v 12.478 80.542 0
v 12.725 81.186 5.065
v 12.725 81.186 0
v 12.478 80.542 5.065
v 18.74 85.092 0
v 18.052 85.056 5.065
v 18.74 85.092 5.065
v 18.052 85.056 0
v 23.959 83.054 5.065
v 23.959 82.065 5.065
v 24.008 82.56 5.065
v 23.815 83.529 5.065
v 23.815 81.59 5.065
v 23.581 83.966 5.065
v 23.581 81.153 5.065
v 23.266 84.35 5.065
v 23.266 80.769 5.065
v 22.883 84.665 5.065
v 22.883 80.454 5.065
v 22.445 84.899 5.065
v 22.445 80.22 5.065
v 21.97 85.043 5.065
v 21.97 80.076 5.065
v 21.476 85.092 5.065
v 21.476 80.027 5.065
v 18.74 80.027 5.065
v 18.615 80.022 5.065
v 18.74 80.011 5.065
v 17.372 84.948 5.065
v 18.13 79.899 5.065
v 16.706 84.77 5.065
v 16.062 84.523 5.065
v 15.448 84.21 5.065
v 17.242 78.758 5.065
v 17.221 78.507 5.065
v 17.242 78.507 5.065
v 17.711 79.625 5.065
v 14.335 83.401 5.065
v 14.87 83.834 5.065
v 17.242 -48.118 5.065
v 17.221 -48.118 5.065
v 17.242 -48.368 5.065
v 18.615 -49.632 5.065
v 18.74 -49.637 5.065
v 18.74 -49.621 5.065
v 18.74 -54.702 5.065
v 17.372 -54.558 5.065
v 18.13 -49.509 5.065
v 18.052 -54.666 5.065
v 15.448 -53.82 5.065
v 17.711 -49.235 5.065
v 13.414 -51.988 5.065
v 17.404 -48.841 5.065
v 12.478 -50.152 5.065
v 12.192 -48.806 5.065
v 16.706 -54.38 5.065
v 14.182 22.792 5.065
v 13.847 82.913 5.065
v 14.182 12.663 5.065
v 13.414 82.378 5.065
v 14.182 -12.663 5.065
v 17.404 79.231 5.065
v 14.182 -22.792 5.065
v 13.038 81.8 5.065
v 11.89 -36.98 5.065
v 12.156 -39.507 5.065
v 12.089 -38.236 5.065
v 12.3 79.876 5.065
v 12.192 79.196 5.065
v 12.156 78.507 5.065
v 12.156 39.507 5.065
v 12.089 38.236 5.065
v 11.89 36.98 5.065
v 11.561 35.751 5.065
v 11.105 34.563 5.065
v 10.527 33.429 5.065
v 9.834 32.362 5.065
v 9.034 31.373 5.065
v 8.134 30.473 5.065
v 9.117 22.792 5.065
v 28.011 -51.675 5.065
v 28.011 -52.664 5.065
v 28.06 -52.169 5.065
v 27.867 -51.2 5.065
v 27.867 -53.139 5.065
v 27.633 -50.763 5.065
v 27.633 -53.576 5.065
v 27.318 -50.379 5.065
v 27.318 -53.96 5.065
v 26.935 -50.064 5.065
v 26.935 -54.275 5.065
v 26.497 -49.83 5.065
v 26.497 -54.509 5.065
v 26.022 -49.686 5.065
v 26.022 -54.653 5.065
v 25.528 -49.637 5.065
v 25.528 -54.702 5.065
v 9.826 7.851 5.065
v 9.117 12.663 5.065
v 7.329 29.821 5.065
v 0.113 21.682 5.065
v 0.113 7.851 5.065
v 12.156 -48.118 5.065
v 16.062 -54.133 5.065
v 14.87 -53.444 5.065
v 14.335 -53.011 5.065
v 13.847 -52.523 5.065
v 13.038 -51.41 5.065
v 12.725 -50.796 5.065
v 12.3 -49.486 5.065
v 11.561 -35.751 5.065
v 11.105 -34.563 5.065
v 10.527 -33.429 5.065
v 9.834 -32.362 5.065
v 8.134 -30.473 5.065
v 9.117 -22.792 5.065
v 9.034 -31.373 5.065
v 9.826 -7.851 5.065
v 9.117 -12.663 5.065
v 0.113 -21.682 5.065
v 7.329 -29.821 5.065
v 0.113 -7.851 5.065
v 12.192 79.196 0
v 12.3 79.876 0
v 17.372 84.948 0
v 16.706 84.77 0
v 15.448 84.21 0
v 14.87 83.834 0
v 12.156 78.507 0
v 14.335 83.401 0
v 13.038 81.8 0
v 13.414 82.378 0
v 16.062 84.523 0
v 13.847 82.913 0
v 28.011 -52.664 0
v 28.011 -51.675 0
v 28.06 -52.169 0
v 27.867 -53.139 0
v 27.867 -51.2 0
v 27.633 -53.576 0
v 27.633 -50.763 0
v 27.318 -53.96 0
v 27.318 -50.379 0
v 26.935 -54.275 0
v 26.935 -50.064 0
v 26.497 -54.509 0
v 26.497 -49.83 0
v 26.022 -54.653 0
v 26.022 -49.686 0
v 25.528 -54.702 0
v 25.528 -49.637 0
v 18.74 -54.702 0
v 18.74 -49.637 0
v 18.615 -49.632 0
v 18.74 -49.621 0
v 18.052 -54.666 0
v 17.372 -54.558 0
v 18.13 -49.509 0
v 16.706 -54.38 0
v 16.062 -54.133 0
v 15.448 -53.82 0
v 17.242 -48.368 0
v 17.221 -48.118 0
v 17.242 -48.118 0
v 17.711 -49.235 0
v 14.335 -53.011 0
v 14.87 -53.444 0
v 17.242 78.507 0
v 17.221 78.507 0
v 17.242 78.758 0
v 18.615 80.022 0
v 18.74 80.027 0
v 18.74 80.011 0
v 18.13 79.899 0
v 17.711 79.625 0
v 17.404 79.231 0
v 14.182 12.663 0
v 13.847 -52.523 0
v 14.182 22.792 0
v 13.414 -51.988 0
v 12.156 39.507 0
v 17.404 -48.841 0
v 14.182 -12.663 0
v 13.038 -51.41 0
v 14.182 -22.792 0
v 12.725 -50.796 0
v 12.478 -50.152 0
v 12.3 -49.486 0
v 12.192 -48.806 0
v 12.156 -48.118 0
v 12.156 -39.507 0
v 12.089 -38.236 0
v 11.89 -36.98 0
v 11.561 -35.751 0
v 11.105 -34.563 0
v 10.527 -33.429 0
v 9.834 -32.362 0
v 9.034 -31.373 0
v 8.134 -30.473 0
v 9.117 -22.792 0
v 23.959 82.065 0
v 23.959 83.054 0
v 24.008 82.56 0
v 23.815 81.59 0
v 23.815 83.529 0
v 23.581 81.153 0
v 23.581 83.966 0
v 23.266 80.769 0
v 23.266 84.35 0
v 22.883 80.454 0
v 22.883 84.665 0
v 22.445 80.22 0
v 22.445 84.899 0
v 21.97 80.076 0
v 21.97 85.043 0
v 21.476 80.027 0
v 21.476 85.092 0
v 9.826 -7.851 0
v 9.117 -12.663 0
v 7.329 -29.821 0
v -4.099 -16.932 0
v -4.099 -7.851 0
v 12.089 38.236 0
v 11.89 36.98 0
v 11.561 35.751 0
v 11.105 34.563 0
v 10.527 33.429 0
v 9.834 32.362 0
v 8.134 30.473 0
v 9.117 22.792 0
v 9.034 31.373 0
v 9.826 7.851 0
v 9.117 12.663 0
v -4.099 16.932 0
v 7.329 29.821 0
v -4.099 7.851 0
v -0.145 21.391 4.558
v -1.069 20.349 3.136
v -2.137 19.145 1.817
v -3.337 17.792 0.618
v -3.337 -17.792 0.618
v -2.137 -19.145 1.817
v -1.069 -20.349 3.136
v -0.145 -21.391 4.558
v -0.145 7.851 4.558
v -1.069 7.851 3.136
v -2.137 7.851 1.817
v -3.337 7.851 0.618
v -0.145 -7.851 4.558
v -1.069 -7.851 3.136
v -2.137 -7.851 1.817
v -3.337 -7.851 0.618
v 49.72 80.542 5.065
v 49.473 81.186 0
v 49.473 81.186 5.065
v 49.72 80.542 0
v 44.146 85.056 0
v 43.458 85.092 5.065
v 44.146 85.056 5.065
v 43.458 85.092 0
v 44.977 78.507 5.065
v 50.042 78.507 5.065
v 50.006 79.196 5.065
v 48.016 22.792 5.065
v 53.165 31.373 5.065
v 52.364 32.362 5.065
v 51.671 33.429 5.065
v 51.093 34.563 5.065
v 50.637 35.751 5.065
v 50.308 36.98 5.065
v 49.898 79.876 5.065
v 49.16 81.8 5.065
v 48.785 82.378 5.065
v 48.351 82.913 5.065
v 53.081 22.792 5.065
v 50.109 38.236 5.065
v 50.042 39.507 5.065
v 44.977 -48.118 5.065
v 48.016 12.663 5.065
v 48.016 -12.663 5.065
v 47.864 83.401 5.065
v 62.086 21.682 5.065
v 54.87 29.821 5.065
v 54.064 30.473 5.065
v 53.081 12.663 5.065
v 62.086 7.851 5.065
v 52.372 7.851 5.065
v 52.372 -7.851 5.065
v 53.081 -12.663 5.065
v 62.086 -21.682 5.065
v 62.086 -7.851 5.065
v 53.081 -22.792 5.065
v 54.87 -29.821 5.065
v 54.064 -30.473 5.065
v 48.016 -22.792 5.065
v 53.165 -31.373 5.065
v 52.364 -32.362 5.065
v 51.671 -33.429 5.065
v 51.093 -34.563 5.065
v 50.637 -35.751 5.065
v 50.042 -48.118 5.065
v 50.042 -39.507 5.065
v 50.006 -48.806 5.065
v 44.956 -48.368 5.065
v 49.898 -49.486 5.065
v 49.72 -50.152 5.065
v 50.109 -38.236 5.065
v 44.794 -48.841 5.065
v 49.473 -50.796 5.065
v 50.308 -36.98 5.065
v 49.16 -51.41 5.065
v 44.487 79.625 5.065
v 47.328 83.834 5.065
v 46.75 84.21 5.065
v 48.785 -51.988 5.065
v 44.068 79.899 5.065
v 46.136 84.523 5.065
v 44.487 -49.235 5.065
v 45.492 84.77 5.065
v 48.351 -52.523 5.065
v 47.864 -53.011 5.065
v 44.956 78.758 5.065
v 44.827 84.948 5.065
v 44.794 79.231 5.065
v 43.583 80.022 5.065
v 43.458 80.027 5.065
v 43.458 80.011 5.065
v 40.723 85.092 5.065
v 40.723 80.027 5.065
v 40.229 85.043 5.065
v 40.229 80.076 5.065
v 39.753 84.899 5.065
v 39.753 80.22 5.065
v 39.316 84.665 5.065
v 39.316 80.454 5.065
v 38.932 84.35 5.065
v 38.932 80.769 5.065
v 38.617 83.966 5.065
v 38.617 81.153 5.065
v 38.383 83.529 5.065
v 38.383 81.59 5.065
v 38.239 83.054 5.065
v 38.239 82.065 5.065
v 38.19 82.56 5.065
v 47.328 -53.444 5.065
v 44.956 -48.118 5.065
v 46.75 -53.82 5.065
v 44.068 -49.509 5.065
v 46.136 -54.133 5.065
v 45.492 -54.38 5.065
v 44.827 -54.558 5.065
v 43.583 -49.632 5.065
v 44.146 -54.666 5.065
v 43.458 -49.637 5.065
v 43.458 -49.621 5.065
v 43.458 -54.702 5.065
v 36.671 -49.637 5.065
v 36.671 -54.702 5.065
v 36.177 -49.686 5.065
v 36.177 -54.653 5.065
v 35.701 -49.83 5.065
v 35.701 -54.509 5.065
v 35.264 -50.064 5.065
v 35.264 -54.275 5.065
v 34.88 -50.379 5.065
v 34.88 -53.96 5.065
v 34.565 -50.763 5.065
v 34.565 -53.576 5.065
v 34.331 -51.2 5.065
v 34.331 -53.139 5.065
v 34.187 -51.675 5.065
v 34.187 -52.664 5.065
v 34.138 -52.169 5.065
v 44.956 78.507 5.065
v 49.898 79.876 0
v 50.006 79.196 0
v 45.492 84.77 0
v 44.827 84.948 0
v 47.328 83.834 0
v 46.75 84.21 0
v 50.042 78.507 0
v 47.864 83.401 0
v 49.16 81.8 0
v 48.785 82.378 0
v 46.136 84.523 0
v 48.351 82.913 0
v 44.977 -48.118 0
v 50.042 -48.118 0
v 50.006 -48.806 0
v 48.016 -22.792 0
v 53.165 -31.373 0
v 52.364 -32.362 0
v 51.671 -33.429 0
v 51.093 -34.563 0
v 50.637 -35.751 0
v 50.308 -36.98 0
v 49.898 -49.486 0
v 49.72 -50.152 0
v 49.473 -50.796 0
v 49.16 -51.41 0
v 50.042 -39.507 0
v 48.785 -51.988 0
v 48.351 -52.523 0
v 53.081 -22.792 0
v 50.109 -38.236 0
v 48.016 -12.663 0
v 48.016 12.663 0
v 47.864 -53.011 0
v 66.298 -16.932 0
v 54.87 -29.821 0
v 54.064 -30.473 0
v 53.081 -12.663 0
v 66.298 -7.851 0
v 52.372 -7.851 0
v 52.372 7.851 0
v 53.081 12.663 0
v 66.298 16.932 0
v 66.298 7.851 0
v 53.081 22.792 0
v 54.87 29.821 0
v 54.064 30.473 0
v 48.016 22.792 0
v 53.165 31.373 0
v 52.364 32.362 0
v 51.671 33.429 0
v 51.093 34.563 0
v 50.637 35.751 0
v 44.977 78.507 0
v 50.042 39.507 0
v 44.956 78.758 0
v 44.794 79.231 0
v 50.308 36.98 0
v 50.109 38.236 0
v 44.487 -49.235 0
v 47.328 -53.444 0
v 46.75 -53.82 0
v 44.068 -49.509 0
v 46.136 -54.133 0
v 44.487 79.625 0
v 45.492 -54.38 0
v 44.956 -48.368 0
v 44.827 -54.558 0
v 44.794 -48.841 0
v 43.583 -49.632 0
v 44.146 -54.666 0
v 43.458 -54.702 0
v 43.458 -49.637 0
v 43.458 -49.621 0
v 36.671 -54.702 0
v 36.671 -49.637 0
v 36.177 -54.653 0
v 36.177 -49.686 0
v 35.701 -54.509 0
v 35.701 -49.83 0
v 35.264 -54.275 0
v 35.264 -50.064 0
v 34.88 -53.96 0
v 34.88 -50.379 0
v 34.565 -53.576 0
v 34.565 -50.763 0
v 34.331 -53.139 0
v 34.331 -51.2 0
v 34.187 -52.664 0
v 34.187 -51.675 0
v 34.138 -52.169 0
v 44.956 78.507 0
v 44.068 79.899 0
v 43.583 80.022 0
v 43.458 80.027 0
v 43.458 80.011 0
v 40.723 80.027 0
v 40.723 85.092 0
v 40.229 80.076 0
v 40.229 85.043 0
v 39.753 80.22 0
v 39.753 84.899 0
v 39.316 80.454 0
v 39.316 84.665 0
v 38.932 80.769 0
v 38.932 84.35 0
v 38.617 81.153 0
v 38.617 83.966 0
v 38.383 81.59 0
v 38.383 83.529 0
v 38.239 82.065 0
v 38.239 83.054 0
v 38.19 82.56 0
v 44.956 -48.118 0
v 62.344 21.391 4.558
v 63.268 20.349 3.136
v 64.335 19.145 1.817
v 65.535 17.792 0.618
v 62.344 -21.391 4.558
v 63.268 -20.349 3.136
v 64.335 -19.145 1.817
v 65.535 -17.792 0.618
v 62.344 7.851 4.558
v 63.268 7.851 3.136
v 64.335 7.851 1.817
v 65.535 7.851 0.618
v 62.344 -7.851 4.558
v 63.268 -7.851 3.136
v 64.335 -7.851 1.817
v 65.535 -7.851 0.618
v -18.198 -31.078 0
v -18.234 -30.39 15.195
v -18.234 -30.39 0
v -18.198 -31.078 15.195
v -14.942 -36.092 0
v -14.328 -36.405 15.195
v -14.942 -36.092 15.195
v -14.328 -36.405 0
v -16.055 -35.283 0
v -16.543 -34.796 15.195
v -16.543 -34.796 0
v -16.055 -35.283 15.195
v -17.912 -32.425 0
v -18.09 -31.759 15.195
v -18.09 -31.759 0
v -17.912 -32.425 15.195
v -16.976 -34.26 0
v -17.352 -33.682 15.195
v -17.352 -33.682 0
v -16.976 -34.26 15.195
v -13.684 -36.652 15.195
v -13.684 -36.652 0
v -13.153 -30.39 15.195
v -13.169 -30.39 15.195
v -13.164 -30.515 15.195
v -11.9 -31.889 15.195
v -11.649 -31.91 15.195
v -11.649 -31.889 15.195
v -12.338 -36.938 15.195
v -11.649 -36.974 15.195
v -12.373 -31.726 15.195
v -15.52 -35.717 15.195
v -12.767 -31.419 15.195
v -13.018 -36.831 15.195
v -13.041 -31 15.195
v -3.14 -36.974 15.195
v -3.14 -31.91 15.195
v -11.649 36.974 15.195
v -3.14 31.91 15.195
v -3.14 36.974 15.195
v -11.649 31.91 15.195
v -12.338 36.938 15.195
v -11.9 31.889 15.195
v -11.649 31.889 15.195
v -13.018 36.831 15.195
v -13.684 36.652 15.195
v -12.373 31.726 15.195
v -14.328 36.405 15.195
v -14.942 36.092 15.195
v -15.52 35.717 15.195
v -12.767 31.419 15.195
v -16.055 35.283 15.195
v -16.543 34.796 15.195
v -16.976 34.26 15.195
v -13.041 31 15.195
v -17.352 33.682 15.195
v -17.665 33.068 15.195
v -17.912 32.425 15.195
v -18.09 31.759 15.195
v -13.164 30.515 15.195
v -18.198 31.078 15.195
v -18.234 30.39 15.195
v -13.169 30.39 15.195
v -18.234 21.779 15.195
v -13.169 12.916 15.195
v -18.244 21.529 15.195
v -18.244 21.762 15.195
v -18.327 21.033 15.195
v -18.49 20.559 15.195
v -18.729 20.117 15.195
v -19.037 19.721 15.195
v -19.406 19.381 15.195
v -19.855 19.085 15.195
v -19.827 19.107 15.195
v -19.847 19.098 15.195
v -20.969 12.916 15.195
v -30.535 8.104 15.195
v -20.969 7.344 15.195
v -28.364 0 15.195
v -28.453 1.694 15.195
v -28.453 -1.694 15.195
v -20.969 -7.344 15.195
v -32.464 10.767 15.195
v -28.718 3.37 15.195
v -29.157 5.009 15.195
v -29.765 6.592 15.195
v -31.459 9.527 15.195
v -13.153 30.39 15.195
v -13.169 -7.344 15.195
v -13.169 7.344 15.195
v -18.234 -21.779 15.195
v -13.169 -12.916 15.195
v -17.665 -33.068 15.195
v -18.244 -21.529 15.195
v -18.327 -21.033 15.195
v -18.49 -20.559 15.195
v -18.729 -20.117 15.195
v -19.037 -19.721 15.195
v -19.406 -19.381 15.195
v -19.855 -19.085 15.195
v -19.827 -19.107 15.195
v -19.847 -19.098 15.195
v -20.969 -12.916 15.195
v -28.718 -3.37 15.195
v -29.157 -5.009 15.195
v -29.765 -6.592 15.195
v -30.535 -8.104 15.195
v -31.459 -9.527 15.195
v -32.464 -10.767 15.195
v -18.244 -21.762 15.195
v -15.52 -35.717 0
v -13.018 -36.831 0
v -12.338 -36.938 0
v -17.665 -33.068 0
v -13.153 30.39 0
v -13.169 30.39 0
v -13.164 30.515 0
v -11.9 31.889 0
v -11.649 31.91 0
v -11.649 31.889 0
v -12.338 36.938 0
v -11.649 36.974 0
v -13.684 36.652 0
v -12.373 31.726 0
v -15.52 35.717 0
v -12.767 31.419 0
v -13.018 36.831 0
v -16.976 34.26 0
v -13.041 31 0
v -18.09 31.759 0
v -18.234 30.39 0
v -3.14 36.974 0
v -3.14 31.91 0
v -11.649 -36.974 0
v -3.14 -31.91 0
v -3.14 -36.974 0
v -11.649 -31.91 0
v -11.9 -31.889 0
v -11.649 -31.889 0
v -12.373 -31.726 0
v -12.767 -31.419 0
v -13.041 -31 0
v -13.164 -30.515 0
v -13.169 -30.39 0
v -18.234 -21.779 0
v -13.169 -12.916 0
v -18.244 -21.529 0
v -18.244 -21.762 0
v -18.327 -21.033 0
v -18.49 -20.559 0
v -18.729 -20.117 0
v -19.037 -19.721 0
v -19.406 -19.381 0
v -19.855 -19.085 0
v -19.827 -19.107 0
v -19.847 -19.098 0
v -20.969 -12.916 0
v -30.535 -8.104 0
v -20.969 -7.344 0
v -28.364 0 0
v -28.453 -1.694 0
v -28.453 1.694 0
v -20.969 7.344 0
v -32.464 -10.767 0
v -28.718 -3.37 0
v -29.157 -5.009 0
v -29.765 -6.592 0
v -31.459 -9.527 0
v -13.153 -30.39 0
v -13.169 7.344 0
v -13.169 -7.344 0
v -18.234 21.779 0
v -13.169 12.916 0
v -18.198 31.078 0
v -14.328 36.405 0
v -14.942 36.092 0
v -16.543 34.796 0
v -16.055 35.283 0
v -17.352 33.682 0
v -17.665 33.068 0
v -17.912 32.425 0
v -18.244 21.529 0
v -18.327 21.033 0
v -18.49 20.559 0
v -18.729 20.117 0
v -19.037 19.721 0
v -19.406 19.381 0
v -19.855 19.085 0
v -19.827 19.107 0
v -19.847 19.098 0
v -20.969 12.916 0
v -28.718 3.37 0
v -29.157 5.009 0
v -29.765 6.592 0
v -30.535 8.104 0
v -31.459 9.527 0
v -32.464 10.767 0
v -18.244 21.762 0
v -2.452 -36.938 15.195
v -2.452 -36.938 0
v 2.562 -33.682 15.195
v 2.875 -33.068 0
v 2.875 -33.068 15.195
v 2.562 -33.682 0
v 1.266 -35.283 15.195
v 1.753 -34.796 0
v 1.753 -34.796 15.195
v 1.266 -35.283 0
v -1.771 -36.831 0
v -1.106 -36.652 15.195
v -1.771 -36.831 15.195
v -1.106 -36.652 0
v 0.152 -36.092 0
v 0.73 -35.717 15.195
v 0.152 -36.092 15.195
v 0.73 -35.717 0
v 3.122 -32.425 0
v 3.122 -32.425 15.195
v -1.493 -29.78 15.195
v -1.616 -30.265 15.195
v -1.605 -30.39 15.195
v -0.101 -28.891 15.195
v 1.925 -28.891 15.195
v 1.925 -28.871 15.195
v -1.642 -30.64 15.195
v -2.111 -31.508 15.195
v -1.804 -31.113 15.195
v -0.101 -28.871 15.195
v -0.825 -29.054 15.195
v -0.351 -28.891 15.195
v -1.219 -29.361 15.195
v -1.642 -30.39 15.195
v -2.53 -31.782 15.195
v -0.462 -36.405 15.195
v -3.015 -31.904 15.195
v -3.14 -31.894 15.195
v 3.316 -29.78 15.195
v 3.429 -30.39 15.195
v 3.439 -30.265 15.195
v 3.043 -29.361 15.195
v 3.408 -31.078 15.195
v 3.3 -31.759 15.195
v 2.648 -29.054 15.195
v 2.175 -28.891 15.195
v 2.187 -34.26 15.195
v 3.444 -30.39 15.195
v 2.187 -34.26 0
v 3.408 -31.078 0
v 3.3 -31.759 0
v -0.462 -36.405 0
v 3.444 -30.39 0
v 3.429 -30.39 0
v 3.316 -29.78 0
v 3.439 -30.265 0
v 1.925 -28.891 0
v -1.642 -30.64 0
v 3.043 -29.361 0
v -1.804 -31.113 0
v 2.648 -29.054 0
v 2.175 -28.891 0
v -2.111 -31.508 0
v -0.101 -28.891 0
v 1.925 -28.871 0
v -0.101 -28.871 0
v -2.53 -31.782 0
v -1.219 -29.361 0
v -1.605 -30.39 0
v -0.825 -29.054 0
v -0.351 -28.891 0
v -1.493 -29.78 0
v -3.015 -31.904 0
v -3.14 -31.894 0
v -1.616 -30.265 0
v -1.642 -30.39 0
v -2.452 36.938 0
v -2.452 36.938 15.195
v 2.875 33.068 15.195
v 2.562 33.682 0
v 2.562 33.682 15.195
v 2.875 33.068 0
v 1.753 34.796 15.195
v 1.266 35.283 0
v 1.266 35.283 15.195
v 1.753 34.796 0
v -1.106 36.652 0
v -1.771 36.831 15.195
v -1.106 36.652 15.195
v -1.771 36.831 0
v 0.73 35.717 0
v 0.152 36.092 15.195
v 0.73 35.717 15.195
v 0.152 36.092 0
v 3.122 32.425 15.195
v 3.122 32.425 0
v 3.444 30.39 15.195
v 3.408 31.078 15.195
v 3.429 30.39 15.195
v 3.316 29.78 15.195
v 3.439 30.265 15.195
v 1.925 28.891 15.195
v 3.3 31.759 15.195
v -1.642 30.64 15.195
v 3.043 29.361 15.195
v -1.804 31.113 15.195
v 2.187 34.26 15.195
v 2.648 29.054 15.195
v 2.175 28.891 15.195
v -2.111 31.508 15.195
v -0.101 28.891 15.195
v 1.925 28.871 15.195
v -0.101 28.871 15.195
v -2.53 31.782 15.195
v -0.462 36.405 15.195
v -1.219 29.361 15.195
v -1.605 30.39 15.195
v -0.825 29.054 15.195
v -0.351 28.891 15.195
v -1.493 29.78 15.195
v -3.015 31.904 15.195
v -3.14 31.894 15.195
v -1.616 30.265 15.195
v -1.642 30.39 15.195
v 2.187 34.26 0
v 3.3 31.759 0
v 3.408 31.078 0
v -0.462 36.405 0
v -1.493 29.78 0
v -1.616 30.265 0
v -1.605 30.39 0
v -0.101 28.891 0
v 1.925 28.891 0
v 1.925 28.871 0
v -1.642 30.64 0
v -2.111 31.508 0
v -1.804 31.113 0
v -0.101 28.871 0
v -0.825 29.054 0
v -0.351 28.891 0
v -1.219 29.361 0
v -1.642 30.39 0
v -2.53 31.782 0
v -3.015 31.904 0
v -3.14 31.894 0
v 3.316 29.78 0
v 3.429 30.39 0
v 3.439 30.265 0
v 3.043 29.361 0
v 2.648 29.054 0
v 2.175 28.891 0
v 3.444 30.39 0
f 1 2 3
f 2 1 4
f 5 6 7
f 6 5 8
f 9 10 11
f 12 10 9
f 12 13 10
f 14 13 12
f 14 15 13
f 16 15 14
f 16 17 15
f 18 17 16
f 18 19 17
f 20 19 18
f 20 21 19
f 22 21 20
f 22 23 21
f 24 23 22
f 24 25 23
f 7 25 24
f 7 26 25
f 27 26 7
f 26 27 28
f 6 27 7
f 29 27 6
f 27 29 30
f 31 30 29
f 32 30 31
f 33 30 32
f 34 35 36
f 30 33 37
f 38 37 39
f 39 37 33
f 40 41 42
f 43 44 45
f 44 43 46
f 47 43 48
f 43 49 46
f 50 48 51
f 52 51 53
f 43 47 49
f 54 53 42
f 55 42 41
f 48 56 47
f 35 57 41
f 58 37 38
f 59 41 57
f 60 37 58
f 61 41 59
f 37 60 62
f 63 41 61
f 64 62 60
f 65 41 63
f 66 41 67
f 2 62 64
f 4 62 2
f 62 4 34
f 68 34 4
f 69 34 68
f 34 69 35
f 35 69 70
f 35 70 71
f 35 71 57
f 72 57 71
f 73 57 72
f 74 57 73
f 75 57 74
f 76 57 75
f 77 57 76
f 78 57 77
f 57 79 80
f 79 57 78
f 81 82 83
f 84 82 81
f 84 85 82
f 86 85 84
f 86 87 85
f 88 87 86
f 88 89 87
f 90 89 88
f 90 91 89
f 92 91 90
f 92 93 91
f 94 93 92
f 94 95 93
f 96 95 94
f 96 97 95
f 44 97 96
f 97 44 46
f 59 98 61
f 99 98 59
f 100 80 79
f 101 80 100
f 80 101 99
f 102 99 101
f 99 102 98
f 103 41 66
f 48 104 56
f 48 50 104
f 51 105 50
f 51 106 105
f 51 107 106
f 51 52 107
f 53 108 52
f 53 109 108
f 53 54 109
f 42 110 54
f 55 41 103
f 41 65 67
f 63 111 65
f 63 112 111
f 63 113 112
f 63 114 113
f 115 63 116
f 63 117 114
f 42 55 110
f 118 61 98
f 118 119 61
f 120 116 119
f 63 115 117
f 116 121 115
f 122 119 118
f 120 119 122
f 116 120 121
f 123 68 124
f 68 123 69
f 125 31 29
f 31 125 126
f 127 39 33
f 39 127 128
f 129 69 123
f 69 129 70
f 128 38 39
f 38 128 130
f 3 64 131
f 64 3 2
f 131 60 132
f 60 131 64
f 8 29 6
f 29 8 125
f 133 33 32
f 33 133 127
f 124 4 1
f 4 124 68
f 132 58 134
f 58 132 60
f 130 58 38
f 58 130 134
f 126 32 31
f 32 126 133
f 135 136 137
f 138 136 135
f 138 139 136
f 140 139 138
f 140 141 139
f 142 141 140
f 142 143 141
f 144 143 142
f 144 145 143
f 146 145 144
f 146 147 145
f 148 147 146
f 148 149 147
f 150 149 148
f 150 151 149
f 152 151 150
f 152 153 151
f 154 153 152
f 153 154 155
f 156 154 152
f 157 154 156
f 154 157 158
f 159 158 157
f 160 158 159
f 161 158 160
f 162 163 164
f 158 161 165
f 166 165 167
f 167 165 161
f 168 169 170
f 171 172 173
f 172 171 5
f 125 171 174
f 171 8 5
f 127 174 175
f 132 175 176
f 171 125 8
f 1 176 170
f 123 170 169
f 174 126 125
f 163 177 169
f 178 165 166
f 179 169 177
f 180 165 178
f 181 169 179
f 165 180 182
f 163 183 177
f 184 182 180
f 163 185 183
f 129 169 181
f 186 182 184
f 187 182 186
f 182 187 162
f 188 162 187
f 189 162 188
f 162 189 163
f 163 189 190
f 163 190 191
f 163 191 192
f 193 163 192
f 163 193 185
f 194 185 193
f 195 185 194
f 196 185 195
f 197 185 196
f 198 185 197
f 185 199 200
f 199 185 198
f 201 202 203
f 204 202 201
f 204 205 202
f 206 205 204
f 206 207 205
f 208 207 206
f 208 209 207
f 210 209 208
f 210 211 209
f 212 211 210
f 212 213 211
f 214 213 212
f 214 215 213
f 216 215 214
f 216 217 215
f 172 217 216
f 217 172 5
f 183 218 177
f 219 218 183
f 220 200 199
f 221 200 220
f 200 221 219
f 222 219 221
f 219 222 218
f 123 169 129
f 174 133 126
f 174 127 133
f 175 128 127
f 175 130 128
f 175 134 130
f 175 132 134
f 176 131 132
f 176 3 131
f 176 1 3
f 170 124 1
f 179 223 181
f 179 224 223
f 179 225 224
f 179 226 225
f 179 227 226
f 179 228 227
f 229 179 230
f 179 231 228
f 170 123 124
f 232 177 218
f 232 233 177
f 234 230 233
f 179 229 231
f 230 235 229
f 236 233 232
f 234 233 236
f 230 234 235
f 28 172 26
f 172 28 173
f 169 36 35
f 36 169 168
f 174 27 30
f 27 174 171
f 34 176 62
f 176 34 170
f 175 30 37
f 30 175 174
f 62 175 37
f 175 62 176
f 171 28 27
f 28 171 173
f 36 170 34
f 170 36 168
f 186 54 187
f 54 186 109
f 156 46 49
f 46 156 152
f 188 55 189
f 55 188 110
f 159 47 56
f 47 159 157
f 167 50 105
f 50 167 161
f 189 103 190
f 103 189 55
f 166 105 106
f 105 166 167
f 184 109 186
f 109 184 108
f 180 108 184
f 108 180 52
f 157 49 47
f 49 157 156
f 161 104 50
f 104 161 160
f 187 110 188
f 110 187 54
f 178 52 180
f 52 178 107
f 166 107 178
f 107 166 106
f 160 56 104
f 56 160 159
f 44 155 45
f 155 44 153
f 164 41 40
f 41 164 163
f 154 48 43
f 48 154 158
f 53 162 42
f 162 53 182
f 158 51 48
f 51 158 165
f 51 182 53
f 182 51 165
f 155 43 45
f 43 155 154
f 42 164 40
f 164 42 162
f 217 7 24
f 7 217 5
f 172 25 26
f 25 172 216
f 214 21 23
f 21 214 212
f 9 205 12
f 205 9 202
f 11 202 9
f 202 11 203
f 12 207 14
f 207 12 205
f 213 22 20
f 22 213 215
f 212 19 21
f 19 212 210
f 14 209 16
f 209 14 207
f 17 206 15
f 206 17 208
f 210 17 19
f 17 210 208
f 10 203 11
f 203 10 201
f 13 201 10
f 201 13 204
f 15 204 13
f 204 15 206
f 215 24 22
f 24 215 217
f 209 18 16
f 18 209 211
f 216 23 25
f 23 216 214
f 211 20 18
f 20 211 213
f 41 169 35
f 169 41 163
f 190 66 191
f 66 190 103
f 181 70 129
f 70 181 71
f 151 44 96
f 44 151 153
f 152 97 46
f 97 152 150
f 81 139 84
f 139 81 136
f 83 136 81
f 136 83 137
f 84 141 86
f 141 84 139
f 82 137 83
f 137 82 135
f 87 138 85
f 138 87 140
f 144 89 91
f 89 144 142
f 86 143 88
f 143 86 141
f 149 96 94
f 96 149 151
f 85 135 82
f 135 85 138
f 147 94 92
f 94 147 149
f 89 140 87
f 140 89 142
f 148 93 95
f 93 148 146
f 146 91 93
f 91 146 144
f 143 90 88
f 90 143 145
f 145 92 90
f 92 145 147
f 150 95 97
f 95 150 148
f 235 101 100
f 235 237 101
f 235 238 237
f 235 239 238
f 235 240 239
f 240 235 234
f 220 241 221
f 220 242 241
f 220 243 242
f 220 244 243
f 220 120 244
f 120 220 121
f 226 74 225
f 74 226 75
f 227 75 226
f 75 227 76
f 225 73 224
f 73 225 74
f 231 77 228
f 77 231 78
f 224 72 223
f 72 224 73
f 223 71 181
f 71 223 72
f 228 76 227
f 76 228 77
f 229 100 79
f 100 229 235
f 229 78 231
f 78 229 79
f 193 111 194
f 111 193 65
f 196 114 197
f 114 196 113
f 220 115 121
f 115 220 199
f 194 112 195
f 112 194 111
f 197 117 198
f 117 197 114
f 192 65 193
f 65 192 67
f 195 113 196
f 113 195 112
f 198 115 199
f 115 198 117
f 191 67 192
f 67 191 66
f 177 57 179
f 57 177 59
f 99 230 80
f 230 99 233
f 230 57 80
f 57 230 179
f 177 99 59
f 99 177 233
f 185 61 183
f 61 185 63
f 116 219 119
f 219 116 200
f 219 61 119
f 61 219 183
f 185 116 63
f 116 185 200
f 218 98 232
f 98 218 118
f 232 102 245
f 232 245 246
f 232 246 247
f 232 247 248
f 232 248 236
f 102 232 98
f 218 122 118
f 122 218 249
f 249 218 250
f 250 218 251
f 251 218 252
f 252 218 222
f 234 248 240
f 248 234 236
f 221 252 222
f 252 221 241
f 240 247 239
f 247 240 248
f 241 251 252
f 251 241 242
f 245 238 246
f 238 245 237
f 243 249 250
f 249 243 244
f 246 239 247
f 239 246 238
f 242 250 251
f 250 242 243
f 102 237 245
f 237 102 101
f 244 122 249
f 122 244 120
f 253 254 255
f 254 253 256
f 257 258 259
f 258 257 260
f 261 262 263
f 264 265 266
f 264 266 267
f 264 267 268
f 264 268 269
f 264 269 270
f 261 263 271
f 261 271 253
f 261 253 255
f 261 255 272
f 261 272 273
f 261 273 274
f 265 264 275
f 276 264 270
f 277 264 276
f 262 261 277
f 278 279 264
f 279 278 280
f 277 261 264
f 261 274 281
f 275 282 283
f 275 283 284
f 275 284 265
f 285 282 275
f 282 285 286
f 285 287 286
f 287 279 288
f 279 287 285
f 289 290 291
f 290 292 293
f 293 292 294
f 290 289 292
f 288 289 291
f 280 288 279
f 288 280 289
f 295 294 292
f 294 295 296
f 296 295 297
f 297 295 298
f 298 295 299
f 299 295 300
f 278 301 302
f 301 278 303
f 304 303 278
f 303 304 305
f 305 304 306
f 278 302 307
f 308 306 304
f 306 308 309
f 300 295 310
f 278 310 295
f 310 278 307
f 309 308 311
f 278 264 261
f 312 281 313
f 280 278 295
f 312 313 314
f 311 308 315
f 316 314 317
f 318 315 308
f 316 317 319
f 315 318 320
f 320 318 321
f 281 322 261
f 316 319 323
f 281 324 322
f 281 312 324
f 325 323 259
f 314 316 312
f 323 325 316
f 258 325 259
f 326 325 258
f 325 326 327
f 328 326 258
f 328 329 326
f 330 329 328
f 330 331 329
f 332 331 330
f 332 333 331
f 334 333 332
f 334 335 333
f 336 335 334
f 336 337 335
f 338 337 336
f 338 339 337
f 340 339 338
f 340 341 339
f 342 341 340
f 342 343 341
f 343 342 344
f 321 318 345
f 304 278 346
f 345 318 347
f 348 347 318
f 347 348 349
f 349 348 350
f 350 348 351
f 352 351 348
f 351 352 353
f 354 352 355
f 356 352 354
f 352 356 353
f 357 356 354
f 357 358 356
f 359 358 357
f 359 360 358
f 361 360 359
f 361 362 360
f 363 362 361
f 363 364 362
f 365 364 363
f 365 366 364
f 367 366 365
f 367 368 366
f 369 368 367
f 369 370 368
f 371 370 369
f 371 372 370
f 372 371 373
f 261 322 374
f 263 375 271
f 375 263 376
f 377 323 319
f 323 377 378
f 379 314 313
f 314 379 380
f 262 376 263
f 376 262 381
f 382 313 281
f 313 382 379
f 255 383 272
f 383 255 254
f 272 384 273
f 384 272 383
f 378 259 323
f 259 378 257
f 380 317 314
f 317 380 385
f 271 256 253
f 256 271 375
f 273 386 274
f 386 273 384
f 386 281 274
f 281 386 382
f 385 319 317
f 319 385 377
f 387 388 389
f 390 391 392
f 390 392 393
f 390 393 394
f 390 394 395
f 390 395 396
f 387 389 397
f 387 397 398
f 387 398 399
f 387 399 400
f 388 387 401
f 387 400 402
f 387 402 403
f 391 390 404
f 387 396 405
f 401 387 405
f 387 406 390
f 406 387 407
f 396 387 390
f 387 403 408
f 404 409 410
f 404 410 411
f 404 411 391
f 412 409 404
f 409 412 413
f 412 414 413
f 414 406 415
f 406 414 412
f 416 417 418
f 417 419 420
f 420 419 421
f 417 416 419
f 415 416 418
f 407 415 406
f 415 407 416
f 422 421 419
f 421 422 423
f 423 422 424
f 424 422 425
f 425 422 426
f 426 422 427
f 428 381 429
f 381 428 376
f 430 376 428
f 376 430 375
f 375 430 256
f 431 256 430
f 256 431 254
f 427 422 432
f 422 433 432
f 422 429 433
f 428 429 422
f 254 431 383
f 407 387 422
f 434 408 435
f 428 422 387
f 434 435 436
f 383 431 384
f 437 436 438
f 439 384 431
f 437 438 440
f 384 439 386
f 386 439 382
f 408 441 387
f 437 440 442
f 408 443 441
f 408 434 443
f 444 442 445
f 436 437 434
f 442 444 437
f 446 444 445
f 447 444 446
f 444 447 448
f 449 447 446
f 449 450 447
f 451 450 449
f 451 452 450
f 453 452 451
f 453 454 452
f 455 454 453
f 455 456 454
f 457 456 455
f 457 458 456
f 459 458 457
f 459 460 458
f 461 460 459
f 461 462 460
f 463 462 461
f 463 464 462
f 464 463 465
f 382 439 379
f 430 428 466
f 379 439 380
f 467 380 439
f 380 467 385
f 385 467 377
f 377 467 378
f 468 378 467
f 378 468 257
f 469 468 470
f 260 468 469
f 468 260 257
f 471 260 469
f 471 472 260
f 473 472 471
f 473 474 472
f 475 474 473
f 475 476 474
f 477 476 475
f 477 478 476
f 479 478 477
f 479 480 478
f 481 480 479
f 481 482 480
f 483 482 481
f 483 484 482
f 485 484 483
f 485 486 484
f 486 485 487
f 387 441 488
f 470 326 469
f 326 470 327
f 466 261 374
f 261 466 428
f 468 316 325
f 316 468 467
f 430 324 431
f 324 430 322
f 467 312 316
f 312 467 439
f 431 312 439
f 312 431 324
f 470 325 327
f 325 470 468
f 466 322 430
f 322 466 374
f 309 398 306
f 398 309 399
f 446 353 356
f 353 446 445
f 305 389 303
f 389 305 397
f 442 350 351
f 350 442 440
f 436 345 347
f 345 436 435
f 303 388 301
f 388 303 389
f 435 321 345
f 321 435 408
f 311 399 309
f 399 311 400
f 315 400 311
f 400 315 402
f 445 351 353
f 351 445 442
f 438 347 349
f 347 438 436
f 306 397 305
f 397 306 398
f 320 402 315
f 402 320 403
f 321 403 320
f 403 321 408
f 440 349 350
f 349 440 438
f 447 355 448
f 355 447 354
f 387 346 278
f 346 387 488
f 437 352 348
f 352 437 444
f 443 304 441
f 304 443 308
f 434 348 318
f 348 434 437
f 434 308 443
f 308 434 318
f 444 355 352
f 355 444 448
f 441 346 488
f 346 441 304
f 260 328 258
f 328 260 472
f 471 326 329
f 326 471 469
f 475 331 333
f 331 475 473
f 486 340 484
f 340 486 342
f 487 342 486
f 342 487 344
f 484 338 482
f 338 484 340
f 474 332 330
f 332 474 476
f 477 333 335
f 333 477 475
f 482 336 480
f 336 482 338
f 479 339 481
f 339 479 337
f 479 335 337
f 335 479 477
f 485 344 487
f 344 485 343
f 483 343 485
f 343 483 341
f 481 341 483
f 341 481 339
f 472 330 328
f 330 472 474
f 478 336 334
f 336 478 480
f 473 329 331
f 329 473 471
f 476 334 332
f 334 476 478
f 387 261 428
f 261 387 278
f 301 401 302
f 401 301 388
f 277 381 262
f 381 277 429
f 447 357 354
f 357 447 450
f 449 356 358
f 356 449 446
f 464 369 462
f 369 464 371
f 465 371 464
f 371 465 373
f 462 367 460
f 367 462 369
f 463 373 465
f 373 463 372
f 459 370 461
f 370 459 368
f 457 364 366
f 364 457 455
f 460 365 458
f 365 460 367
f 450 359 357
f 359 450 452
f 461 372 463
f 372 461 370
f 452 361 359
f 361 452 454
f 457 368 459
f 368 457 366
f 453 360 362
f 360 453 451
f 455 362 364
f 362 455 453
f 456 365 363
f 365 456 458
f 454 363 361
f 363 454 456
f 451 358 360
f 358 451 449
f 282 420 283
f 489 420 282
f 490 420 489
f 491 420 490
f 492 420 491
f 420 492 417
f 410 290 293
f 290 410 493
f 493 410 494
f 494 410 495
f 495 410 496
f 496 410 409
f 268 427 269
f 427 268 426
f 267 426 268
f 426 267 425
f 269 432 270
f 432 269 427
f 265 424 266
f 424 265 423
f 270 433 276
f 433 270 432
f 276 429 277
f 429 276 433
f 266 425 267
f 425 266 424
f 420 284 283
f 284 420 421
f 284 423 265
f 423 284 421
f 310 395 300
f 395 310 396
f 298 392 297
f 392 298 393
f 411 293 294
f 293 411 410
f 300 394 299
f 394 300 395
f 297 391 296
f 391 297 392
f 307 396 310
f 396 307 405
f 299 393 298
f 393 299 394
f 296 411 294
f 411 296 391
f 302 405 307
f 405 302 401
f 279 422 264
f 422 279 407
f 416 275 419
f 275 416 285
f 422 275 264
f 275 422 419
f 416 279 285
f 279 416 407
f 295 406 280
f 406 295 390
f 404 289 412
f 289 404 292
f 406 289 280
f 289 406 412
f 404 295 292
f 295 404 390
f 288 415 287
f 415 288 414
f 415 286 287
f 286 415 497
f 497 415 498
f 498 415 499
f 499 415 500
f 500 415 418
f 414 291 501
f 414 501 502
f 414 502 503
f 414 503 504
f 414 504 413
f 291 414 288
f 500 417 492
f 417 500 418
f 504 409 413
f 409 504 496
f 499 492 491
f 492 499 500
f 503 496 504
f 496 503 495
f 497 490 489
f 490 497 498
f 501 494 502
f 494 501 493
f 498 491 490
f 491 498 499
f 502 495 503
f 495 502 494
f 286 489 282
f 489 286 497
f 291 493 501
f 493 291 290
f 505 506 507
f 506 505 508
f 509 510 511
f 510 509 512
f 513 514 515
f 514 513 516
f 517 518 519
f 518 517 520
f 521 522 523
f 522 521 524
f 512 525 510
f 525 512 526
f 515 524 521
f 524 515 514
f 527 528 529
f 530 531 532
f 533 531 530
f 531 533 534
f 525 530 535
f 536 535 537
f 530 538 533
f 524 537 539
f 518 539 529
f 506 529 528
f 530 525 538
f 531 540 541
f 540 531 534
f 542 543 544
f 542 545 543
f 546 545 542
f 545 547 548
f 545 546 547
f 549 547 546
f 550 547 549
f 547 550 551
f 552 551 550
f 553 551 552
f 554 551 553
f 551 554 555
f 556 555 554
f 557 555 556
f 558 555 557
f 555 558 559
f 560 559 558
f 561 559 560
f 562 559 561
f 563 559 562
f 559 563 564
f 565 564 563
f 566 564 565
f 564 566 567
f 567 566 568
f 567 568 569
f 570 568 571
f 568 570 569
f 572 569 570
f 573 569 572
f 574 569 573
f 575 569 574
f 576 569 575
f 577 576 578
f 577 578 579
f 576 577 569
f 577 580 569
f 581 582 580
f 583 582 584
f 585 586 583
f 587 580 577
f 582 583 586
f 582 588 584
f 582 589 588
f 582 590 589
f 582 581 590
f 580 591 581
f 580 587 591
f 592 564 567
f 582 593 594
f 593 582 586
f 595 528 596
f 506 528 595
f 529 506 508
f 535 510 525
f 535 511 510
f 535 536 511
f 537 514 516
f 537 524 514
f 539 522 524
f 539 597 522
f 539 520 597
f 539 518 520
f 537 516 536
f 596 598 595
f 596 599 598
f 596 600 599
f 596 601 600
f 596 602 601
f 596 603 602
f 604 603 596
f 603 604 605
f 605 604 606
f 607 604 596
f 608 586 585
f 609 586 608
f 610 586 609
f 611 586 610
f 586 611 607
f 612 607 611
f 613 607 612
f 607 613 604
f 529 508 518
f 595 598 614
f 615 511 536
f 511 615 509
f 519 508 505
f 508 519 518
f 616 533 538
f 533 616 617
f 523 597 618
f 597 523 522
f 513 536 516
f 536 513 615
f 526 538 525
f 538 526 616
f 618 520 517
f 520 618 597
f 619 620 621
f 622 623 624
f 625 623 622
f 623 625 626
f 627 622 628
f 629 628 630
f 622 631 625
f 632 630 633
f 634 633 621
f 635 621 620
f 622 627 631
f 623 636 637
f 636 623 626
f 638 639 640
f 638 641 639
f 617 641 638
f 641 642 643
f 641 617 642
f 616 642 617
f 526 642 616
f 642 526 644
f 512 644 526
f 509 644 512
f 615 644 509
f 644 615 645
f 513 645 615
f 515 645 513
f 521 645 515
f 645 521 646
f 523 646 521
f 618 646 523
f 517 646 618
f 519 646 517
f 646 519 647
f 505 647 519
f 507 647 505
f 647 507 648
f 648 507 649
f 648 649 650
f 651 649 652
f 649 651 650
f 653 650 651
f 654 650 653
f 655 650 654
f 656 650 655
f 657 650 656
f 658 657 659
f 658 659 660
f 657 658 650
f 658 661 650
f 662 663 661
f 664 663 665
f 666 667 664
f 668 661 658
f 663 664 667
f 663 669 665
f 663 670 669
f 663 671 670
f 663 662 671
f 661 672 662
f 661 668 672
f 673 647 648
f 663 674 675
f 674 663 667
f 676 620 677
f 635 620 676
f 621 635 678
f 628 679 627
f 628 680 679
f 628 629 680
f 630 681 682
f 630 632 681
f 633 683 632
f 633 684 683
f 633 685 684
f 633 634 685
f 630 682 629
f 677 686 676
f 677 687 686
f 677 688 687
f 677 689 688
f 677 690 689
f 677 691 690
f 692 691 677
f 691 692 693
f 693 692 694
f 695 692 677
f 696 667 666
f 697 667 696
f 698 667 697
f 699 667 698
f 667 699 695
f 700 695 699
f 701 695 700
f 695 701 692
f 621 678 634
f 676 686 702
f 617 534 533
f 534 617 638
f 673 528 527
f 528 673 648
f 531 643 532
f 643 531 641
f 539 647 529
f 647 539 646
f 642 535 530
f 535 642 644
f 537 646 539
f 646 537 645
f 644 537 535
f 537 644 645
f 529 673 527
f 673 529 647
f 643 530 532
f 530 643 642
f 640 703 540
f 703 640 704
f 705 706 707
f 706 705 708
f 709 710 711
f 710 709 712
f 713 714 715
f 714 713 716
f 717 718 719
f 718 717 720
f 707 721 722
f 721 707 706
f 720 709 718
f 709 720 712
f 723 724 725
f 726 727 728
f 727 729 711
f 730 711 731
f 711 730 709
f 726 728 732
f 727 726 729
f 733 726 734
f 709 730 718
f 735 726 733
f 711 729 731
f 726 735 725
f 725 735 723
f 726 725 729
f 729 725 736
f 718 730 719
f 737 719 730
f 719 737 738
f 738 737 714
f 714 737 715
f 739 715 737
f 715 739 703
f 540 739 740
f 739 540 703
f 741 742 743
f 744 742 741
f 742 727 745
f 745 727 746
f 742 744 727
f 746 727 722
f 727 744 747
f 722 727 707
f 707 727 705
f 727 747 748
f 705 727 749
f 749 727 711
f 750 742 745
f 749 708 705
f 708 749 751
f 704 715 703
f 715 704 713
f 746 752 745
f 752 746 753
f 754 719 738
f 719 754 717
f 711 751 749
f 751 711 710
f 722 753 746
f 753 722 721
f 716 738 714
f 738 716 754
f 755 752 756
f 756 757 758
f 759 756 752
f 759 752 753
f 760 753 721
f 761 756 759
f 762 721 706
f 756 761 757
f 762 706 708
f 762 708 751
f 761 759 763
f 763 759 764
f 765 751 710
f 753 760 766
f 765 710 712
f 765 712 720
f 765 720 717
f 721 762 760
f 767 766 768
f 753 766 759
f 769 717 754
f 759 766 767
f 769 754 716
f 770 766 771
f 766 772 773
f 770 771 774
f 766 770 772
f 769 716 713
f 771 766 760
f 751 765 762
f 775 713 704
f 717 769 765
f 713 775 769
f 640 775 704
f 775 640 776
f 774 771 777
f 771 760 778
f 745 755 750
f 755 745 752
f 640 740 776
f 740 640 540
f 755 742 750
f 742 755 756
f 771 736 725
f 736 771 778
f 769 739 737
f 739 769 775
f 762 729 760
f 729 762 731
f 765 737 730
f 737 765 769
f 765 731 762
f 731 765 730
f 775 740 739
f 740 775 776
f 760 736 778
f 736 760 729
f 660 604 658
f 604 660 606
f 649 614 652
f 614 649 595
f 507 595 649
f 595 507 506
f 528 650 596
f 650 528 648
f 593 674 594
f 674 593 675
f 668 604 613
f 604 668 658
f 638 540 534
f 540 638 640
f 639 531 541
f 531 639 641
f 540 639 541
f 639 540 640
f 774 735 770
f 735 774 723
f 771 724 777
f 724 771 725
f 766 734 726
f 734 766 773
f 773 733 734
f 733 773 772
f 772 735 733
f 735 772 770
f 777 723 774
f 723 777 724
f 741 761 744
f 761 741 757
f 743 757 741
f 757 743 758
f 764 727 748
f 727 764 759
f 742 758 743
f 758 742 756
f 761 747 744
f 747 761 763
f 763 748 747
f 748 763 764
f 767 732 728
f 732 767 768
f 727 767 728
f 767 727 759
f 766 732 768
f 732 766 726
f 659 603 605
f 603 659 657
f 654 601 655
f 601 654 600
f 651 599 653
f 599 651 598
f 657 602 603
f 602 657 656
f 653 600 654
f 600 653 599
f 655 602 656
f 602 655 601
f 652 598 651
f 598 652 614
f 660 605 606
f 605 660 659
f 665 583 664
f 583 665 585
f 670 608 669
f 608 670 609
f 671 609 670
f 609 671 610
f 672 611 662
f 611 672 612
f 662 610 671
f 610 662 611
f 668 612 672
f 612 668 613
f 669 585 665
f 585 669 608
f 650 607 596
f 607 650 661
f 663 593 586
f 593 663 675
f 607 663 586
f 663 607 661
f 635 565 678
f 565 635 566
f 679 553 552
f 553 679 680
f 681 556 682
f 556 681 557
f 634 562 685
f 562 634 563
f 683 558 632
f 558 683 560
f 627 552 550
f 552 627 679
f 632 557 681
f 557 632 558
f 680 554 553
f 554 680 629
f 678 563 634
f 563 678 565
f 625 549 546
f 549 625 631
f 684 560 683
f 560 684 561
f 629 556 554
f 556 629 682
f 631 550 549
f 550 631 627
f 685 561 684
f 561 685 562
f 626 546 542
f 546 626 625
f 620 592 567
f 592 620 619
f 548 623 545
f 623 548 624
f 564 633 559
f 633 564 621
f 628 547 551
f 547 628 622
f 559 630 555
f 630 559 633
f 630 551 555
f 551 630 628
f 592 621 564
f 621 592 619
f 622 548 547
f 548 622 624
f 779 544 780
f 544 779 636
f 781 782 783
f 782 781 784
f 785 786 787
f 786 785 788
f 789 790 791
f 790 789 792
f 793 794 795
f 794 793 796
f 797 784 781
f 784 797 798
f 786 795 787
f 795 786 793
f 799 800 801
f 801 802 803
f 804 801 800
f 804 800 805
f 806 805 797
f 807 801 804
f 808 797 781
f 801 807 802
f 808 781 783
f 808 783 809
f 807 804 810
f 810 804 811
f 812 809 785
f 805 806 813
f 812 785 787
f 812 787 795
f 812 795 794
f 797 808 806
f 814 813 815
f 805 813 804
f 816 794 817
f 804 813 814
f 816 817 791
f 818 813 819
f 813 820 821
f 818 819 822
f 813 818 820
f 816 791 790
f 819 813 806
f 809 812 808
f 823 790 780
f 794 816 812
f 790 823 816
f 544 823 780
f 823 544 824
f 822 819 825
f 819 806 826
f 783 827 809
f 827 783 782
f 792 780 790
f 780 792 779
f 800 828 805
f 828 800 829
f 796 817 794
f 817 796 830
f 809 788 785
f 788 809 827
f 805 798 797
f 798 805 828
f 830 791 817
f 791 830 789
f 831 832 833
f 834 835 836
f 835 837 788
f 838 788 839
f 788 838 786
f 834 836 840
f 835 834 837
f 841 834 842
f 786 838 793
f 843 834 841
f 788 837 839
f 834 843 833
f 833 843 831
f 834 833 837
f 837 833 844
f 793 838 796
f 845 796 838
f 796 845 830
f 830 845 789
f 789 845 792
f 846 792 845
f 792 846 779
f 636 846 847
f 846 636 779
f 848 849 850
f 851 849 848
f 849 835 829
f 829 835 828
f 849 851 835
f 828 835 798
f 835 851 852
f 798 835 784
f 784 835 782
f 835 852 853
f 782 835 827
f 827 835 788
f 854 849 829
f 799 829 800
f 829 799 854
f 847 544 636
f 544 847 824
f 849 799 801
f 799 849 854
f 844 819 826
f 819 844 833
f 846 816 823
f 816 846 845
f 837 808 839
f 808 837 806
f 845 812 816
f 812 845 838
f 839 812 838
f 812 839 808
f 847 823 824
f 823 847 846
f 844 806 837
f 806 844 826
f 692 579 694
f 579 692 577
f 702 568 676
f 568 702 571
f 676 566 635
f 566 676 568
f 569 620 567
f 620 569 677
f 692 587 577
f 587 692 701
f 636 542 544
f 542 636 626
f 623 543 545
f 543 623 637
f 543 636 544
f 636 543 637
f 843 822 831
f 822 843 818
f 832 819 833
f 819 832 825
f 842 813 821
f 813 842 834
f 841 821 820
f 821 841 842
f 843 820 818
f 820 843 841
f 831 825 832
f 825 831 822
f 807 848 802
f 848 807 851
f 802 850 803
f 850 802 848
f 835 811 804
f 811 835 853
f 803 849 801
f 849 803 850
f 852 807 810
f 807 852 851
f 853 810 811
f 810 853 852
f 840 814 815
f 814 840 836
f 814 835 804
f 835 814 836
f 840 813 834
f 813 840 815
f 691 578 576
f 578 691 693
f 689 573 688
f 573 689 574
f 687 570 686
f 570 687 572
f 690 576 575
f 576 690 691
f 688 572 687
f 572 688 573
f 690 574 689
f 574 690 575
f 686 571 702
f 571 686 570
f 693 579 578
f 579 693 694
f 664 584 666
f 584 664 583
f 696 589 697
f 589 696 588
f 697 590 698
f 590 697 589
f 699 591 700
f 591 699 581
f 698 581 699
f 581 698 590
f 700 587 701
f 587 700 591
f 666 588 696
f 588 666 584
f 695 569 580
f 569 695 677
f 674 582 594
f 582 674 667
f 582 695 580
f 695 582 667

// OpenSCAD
// Depending on your printer, you should add an extra 1 to 2 mm.
Phone_Length=128;

// Depending on your printer, you should add an extra 1 to 2 mm.
Phone_Width=63;

// Depending on your printer, you should add an extra 1 to 2 mm.
Phone_Thickness = 11.4;

// Offset the phone vertically. This is useful if your phone have side buttons at the middle that is blocked by the side grip. A positive value will shift the phone upwards, while a negative value shifts it downwards.
Vertical_Offset = 15;

// Allow you to attach two vertical pieces instead of one. This can be useful if you want to charge your phone while it's in the holder.
Dual_Vertical = 10; // [0:10]

// Trade off between improved grip and ease of insertion/removal. Increasing this number will increase height of the top catch, improving grip but making it harder to remove the phone. The default should be fine for most cases.
Grip = -3; // [-10:10]

// Diameter of the bar where the holder is to be mounted.
Handle_Bar_Diameter = 32;
// Distance from the handle bar to the back of the phone. A smaller number will give a lower profile.
Holder_Height = 15; // [11:20]

// Fatness of Handlebarholder
Holder_Fat = 15; // [5:15]

// Scale. Have to scale for ABS shrinking
scaleing = 1.013;


/* [Hidden] */
$fs = 0.5;
$fa = 6;

scale([scaleing,scaleing,scaleing]) {
 translate([0,0,0])   Vertical_Piece();
    if(Dual_Vertical > 0) {
 translate([35+Holder_Height+Phone_Thickness,0,0])  mirror([1,0,0]) Vertical_Piece();
    }
translate([-30,0,0])    Horizontal_Piece();
}




module copy_mirror(vec=[0,1,0]) {
 union() {
  children();
  mirror(vec) children();
 }
};

module rounded_corner(vec=[0,0,0],rot=0,h=5) {
 translate(vec) rotate([0,0,rot]) difference(){
  intersection(){
   cylinder(r=6.5,h=h);
   translate([-6.5,0,0]) cube([6.5,6.5,h]);
  };
  translate([0,0,-1]) cylinder(r=1.5,h=h+2);
 };
};



module Vertical_Piece() {
// Vertical Piece
//translate([2.5,0,0]) rotate([0,-90,0]) difference(){
difference(){
 union() {
  translate ([0,Vertical_Offset,0]) union(){
   translate([18.5,Phone_Length/2,0]) cube([Phone_Thickness/2+Grip,5,5]);
   translate([18.5+Phone_Thickness/2+Grip,Phone_Length/2+2.5,0]) cylinder(r=2.5,h=5);
   copy_mirror([0,1,0]) rounded_corner([18.5,Phone_Length/2-1.5,0]);
   translate([12,-Phone_Length/2+1.5,0]) cube([5,Phone_Length-3,5]);
   translate([18.5,-Phone_Length/2-5,0]) cube([Phone_Thickness/2+1,5,5]);
   translate([19.5+Phone_Thickness/2,-Phone_Length/2-2.5,0]) cylinder(r=2.5,h=5);
//   translate([18.5,-Phone_Length/2-5,0]) cube([Phone_Thickness-1.5,5,5]);
//   translate([17+Phone_Thickness,-Phone_Length/2-2.5,0]) cylinder(r=2.5,h=5);
  };
  linear_extrude(height=5) polygon([[12,-39],[12,39],[10.3923,33],[-10,10],[-10,-10],[10.3923,-33]]);
 }
 copy_mirror([0,1,0]) translate([0,39,-1]) cylinder(r=12,h=5+2);
 copy_mirror([0,1,0]) translate([9,12.5,-1]) cube([5,10,5+2]);
 translate([17-Holder_Height-15,-(Holder_Fat+0.5)/2,-1]) cube([Holder_Height/2+0.2+15,Holder_Fat+0.5,5+2]);
 //%translate([-Holder_Height,-30,-1]) cube([17,60,5+2]);

 translate([17-Holder_Height-Handle_Bar_Diameter/2,-30,5/2+Dual_Vertical]) rotate([-90,0,0]) cylinder(r=Handle_Bar_Diameter/2,h=60);
}

}


module Horizontal_Piece() {
// Horizontal Piece
//translate([0,2.5,0]) rotate([90,0,0]) copy_mirror([1,0,0]) difference(){
 rotate([0,0,-90]) copy_mirror([1,0,0]) difference(){
 union(){
//  linear_extrude(height=5) polygon([[0,-3],[10,-3],[14.6768,10.0145],[17.5,12],[Phone_Width/2-1.5,12],[Phone_Width/2-1.5,17],[0,17]]);
  linear_extrude(height=Holder_Fat) polygon([[0,-3],[10,-3],[18.84,10.4],[21.5,12],[Phone_Width/2-1.5,12],[Phone_Width/2-1.5,17],[0,17]]);
  rounded_corner([Phone_Width/2-1.5,18.5,0],180,h=Holder_Fat);
  translate([Phone_Width/2,18.5,0]) cube([5,Phone_Thickness-3,Holder_Fat]);
  rounded_corner([Phone_Width/2-1.5,17+Phone_Thickness-1.5,0],-90,h=Holder_Fat);
  translate([Phone_Width/2-1.5,17+Phone_Thickness+1.5,0]) cylinder(r=1.5,h=Holder_Fat);
  translate([Phone_Width/2-1.5,17+Phone_Thickness+5-1.5,0]) cylinder(r=1.5,h=Holder_Fat);
  translate([Phone_Width/2-3,17+Phone_Thickness+1.5,0]) cube([1.5,2,Holder_Fat]);
//  translate([5.5/2,17,5/2]) rotate([90,0,0]) linear_extrude(height=20) polygon([[0,0],[5,0],[0,5]]);
 };
 translate([21.5,9,-1]) cylinder(r=3,h=Holder_Fat+2);
 translate([0,-Handle_Bar_Diameter/2-Holder_Height+17,-1]) cylinder(r=Handle_Bar_Diameter/2,h=Holder_Fat+2);
 
 translate([-5.5/2+Dual_Vertical,17-(Holder_Height/2+0.2),-1]) cube([5.5,Holder_Height/2+0.2+1,Holder_Fat+2]); // The poorly named Dual_Vertical contains the horizontal offset for the slot.
};
}
